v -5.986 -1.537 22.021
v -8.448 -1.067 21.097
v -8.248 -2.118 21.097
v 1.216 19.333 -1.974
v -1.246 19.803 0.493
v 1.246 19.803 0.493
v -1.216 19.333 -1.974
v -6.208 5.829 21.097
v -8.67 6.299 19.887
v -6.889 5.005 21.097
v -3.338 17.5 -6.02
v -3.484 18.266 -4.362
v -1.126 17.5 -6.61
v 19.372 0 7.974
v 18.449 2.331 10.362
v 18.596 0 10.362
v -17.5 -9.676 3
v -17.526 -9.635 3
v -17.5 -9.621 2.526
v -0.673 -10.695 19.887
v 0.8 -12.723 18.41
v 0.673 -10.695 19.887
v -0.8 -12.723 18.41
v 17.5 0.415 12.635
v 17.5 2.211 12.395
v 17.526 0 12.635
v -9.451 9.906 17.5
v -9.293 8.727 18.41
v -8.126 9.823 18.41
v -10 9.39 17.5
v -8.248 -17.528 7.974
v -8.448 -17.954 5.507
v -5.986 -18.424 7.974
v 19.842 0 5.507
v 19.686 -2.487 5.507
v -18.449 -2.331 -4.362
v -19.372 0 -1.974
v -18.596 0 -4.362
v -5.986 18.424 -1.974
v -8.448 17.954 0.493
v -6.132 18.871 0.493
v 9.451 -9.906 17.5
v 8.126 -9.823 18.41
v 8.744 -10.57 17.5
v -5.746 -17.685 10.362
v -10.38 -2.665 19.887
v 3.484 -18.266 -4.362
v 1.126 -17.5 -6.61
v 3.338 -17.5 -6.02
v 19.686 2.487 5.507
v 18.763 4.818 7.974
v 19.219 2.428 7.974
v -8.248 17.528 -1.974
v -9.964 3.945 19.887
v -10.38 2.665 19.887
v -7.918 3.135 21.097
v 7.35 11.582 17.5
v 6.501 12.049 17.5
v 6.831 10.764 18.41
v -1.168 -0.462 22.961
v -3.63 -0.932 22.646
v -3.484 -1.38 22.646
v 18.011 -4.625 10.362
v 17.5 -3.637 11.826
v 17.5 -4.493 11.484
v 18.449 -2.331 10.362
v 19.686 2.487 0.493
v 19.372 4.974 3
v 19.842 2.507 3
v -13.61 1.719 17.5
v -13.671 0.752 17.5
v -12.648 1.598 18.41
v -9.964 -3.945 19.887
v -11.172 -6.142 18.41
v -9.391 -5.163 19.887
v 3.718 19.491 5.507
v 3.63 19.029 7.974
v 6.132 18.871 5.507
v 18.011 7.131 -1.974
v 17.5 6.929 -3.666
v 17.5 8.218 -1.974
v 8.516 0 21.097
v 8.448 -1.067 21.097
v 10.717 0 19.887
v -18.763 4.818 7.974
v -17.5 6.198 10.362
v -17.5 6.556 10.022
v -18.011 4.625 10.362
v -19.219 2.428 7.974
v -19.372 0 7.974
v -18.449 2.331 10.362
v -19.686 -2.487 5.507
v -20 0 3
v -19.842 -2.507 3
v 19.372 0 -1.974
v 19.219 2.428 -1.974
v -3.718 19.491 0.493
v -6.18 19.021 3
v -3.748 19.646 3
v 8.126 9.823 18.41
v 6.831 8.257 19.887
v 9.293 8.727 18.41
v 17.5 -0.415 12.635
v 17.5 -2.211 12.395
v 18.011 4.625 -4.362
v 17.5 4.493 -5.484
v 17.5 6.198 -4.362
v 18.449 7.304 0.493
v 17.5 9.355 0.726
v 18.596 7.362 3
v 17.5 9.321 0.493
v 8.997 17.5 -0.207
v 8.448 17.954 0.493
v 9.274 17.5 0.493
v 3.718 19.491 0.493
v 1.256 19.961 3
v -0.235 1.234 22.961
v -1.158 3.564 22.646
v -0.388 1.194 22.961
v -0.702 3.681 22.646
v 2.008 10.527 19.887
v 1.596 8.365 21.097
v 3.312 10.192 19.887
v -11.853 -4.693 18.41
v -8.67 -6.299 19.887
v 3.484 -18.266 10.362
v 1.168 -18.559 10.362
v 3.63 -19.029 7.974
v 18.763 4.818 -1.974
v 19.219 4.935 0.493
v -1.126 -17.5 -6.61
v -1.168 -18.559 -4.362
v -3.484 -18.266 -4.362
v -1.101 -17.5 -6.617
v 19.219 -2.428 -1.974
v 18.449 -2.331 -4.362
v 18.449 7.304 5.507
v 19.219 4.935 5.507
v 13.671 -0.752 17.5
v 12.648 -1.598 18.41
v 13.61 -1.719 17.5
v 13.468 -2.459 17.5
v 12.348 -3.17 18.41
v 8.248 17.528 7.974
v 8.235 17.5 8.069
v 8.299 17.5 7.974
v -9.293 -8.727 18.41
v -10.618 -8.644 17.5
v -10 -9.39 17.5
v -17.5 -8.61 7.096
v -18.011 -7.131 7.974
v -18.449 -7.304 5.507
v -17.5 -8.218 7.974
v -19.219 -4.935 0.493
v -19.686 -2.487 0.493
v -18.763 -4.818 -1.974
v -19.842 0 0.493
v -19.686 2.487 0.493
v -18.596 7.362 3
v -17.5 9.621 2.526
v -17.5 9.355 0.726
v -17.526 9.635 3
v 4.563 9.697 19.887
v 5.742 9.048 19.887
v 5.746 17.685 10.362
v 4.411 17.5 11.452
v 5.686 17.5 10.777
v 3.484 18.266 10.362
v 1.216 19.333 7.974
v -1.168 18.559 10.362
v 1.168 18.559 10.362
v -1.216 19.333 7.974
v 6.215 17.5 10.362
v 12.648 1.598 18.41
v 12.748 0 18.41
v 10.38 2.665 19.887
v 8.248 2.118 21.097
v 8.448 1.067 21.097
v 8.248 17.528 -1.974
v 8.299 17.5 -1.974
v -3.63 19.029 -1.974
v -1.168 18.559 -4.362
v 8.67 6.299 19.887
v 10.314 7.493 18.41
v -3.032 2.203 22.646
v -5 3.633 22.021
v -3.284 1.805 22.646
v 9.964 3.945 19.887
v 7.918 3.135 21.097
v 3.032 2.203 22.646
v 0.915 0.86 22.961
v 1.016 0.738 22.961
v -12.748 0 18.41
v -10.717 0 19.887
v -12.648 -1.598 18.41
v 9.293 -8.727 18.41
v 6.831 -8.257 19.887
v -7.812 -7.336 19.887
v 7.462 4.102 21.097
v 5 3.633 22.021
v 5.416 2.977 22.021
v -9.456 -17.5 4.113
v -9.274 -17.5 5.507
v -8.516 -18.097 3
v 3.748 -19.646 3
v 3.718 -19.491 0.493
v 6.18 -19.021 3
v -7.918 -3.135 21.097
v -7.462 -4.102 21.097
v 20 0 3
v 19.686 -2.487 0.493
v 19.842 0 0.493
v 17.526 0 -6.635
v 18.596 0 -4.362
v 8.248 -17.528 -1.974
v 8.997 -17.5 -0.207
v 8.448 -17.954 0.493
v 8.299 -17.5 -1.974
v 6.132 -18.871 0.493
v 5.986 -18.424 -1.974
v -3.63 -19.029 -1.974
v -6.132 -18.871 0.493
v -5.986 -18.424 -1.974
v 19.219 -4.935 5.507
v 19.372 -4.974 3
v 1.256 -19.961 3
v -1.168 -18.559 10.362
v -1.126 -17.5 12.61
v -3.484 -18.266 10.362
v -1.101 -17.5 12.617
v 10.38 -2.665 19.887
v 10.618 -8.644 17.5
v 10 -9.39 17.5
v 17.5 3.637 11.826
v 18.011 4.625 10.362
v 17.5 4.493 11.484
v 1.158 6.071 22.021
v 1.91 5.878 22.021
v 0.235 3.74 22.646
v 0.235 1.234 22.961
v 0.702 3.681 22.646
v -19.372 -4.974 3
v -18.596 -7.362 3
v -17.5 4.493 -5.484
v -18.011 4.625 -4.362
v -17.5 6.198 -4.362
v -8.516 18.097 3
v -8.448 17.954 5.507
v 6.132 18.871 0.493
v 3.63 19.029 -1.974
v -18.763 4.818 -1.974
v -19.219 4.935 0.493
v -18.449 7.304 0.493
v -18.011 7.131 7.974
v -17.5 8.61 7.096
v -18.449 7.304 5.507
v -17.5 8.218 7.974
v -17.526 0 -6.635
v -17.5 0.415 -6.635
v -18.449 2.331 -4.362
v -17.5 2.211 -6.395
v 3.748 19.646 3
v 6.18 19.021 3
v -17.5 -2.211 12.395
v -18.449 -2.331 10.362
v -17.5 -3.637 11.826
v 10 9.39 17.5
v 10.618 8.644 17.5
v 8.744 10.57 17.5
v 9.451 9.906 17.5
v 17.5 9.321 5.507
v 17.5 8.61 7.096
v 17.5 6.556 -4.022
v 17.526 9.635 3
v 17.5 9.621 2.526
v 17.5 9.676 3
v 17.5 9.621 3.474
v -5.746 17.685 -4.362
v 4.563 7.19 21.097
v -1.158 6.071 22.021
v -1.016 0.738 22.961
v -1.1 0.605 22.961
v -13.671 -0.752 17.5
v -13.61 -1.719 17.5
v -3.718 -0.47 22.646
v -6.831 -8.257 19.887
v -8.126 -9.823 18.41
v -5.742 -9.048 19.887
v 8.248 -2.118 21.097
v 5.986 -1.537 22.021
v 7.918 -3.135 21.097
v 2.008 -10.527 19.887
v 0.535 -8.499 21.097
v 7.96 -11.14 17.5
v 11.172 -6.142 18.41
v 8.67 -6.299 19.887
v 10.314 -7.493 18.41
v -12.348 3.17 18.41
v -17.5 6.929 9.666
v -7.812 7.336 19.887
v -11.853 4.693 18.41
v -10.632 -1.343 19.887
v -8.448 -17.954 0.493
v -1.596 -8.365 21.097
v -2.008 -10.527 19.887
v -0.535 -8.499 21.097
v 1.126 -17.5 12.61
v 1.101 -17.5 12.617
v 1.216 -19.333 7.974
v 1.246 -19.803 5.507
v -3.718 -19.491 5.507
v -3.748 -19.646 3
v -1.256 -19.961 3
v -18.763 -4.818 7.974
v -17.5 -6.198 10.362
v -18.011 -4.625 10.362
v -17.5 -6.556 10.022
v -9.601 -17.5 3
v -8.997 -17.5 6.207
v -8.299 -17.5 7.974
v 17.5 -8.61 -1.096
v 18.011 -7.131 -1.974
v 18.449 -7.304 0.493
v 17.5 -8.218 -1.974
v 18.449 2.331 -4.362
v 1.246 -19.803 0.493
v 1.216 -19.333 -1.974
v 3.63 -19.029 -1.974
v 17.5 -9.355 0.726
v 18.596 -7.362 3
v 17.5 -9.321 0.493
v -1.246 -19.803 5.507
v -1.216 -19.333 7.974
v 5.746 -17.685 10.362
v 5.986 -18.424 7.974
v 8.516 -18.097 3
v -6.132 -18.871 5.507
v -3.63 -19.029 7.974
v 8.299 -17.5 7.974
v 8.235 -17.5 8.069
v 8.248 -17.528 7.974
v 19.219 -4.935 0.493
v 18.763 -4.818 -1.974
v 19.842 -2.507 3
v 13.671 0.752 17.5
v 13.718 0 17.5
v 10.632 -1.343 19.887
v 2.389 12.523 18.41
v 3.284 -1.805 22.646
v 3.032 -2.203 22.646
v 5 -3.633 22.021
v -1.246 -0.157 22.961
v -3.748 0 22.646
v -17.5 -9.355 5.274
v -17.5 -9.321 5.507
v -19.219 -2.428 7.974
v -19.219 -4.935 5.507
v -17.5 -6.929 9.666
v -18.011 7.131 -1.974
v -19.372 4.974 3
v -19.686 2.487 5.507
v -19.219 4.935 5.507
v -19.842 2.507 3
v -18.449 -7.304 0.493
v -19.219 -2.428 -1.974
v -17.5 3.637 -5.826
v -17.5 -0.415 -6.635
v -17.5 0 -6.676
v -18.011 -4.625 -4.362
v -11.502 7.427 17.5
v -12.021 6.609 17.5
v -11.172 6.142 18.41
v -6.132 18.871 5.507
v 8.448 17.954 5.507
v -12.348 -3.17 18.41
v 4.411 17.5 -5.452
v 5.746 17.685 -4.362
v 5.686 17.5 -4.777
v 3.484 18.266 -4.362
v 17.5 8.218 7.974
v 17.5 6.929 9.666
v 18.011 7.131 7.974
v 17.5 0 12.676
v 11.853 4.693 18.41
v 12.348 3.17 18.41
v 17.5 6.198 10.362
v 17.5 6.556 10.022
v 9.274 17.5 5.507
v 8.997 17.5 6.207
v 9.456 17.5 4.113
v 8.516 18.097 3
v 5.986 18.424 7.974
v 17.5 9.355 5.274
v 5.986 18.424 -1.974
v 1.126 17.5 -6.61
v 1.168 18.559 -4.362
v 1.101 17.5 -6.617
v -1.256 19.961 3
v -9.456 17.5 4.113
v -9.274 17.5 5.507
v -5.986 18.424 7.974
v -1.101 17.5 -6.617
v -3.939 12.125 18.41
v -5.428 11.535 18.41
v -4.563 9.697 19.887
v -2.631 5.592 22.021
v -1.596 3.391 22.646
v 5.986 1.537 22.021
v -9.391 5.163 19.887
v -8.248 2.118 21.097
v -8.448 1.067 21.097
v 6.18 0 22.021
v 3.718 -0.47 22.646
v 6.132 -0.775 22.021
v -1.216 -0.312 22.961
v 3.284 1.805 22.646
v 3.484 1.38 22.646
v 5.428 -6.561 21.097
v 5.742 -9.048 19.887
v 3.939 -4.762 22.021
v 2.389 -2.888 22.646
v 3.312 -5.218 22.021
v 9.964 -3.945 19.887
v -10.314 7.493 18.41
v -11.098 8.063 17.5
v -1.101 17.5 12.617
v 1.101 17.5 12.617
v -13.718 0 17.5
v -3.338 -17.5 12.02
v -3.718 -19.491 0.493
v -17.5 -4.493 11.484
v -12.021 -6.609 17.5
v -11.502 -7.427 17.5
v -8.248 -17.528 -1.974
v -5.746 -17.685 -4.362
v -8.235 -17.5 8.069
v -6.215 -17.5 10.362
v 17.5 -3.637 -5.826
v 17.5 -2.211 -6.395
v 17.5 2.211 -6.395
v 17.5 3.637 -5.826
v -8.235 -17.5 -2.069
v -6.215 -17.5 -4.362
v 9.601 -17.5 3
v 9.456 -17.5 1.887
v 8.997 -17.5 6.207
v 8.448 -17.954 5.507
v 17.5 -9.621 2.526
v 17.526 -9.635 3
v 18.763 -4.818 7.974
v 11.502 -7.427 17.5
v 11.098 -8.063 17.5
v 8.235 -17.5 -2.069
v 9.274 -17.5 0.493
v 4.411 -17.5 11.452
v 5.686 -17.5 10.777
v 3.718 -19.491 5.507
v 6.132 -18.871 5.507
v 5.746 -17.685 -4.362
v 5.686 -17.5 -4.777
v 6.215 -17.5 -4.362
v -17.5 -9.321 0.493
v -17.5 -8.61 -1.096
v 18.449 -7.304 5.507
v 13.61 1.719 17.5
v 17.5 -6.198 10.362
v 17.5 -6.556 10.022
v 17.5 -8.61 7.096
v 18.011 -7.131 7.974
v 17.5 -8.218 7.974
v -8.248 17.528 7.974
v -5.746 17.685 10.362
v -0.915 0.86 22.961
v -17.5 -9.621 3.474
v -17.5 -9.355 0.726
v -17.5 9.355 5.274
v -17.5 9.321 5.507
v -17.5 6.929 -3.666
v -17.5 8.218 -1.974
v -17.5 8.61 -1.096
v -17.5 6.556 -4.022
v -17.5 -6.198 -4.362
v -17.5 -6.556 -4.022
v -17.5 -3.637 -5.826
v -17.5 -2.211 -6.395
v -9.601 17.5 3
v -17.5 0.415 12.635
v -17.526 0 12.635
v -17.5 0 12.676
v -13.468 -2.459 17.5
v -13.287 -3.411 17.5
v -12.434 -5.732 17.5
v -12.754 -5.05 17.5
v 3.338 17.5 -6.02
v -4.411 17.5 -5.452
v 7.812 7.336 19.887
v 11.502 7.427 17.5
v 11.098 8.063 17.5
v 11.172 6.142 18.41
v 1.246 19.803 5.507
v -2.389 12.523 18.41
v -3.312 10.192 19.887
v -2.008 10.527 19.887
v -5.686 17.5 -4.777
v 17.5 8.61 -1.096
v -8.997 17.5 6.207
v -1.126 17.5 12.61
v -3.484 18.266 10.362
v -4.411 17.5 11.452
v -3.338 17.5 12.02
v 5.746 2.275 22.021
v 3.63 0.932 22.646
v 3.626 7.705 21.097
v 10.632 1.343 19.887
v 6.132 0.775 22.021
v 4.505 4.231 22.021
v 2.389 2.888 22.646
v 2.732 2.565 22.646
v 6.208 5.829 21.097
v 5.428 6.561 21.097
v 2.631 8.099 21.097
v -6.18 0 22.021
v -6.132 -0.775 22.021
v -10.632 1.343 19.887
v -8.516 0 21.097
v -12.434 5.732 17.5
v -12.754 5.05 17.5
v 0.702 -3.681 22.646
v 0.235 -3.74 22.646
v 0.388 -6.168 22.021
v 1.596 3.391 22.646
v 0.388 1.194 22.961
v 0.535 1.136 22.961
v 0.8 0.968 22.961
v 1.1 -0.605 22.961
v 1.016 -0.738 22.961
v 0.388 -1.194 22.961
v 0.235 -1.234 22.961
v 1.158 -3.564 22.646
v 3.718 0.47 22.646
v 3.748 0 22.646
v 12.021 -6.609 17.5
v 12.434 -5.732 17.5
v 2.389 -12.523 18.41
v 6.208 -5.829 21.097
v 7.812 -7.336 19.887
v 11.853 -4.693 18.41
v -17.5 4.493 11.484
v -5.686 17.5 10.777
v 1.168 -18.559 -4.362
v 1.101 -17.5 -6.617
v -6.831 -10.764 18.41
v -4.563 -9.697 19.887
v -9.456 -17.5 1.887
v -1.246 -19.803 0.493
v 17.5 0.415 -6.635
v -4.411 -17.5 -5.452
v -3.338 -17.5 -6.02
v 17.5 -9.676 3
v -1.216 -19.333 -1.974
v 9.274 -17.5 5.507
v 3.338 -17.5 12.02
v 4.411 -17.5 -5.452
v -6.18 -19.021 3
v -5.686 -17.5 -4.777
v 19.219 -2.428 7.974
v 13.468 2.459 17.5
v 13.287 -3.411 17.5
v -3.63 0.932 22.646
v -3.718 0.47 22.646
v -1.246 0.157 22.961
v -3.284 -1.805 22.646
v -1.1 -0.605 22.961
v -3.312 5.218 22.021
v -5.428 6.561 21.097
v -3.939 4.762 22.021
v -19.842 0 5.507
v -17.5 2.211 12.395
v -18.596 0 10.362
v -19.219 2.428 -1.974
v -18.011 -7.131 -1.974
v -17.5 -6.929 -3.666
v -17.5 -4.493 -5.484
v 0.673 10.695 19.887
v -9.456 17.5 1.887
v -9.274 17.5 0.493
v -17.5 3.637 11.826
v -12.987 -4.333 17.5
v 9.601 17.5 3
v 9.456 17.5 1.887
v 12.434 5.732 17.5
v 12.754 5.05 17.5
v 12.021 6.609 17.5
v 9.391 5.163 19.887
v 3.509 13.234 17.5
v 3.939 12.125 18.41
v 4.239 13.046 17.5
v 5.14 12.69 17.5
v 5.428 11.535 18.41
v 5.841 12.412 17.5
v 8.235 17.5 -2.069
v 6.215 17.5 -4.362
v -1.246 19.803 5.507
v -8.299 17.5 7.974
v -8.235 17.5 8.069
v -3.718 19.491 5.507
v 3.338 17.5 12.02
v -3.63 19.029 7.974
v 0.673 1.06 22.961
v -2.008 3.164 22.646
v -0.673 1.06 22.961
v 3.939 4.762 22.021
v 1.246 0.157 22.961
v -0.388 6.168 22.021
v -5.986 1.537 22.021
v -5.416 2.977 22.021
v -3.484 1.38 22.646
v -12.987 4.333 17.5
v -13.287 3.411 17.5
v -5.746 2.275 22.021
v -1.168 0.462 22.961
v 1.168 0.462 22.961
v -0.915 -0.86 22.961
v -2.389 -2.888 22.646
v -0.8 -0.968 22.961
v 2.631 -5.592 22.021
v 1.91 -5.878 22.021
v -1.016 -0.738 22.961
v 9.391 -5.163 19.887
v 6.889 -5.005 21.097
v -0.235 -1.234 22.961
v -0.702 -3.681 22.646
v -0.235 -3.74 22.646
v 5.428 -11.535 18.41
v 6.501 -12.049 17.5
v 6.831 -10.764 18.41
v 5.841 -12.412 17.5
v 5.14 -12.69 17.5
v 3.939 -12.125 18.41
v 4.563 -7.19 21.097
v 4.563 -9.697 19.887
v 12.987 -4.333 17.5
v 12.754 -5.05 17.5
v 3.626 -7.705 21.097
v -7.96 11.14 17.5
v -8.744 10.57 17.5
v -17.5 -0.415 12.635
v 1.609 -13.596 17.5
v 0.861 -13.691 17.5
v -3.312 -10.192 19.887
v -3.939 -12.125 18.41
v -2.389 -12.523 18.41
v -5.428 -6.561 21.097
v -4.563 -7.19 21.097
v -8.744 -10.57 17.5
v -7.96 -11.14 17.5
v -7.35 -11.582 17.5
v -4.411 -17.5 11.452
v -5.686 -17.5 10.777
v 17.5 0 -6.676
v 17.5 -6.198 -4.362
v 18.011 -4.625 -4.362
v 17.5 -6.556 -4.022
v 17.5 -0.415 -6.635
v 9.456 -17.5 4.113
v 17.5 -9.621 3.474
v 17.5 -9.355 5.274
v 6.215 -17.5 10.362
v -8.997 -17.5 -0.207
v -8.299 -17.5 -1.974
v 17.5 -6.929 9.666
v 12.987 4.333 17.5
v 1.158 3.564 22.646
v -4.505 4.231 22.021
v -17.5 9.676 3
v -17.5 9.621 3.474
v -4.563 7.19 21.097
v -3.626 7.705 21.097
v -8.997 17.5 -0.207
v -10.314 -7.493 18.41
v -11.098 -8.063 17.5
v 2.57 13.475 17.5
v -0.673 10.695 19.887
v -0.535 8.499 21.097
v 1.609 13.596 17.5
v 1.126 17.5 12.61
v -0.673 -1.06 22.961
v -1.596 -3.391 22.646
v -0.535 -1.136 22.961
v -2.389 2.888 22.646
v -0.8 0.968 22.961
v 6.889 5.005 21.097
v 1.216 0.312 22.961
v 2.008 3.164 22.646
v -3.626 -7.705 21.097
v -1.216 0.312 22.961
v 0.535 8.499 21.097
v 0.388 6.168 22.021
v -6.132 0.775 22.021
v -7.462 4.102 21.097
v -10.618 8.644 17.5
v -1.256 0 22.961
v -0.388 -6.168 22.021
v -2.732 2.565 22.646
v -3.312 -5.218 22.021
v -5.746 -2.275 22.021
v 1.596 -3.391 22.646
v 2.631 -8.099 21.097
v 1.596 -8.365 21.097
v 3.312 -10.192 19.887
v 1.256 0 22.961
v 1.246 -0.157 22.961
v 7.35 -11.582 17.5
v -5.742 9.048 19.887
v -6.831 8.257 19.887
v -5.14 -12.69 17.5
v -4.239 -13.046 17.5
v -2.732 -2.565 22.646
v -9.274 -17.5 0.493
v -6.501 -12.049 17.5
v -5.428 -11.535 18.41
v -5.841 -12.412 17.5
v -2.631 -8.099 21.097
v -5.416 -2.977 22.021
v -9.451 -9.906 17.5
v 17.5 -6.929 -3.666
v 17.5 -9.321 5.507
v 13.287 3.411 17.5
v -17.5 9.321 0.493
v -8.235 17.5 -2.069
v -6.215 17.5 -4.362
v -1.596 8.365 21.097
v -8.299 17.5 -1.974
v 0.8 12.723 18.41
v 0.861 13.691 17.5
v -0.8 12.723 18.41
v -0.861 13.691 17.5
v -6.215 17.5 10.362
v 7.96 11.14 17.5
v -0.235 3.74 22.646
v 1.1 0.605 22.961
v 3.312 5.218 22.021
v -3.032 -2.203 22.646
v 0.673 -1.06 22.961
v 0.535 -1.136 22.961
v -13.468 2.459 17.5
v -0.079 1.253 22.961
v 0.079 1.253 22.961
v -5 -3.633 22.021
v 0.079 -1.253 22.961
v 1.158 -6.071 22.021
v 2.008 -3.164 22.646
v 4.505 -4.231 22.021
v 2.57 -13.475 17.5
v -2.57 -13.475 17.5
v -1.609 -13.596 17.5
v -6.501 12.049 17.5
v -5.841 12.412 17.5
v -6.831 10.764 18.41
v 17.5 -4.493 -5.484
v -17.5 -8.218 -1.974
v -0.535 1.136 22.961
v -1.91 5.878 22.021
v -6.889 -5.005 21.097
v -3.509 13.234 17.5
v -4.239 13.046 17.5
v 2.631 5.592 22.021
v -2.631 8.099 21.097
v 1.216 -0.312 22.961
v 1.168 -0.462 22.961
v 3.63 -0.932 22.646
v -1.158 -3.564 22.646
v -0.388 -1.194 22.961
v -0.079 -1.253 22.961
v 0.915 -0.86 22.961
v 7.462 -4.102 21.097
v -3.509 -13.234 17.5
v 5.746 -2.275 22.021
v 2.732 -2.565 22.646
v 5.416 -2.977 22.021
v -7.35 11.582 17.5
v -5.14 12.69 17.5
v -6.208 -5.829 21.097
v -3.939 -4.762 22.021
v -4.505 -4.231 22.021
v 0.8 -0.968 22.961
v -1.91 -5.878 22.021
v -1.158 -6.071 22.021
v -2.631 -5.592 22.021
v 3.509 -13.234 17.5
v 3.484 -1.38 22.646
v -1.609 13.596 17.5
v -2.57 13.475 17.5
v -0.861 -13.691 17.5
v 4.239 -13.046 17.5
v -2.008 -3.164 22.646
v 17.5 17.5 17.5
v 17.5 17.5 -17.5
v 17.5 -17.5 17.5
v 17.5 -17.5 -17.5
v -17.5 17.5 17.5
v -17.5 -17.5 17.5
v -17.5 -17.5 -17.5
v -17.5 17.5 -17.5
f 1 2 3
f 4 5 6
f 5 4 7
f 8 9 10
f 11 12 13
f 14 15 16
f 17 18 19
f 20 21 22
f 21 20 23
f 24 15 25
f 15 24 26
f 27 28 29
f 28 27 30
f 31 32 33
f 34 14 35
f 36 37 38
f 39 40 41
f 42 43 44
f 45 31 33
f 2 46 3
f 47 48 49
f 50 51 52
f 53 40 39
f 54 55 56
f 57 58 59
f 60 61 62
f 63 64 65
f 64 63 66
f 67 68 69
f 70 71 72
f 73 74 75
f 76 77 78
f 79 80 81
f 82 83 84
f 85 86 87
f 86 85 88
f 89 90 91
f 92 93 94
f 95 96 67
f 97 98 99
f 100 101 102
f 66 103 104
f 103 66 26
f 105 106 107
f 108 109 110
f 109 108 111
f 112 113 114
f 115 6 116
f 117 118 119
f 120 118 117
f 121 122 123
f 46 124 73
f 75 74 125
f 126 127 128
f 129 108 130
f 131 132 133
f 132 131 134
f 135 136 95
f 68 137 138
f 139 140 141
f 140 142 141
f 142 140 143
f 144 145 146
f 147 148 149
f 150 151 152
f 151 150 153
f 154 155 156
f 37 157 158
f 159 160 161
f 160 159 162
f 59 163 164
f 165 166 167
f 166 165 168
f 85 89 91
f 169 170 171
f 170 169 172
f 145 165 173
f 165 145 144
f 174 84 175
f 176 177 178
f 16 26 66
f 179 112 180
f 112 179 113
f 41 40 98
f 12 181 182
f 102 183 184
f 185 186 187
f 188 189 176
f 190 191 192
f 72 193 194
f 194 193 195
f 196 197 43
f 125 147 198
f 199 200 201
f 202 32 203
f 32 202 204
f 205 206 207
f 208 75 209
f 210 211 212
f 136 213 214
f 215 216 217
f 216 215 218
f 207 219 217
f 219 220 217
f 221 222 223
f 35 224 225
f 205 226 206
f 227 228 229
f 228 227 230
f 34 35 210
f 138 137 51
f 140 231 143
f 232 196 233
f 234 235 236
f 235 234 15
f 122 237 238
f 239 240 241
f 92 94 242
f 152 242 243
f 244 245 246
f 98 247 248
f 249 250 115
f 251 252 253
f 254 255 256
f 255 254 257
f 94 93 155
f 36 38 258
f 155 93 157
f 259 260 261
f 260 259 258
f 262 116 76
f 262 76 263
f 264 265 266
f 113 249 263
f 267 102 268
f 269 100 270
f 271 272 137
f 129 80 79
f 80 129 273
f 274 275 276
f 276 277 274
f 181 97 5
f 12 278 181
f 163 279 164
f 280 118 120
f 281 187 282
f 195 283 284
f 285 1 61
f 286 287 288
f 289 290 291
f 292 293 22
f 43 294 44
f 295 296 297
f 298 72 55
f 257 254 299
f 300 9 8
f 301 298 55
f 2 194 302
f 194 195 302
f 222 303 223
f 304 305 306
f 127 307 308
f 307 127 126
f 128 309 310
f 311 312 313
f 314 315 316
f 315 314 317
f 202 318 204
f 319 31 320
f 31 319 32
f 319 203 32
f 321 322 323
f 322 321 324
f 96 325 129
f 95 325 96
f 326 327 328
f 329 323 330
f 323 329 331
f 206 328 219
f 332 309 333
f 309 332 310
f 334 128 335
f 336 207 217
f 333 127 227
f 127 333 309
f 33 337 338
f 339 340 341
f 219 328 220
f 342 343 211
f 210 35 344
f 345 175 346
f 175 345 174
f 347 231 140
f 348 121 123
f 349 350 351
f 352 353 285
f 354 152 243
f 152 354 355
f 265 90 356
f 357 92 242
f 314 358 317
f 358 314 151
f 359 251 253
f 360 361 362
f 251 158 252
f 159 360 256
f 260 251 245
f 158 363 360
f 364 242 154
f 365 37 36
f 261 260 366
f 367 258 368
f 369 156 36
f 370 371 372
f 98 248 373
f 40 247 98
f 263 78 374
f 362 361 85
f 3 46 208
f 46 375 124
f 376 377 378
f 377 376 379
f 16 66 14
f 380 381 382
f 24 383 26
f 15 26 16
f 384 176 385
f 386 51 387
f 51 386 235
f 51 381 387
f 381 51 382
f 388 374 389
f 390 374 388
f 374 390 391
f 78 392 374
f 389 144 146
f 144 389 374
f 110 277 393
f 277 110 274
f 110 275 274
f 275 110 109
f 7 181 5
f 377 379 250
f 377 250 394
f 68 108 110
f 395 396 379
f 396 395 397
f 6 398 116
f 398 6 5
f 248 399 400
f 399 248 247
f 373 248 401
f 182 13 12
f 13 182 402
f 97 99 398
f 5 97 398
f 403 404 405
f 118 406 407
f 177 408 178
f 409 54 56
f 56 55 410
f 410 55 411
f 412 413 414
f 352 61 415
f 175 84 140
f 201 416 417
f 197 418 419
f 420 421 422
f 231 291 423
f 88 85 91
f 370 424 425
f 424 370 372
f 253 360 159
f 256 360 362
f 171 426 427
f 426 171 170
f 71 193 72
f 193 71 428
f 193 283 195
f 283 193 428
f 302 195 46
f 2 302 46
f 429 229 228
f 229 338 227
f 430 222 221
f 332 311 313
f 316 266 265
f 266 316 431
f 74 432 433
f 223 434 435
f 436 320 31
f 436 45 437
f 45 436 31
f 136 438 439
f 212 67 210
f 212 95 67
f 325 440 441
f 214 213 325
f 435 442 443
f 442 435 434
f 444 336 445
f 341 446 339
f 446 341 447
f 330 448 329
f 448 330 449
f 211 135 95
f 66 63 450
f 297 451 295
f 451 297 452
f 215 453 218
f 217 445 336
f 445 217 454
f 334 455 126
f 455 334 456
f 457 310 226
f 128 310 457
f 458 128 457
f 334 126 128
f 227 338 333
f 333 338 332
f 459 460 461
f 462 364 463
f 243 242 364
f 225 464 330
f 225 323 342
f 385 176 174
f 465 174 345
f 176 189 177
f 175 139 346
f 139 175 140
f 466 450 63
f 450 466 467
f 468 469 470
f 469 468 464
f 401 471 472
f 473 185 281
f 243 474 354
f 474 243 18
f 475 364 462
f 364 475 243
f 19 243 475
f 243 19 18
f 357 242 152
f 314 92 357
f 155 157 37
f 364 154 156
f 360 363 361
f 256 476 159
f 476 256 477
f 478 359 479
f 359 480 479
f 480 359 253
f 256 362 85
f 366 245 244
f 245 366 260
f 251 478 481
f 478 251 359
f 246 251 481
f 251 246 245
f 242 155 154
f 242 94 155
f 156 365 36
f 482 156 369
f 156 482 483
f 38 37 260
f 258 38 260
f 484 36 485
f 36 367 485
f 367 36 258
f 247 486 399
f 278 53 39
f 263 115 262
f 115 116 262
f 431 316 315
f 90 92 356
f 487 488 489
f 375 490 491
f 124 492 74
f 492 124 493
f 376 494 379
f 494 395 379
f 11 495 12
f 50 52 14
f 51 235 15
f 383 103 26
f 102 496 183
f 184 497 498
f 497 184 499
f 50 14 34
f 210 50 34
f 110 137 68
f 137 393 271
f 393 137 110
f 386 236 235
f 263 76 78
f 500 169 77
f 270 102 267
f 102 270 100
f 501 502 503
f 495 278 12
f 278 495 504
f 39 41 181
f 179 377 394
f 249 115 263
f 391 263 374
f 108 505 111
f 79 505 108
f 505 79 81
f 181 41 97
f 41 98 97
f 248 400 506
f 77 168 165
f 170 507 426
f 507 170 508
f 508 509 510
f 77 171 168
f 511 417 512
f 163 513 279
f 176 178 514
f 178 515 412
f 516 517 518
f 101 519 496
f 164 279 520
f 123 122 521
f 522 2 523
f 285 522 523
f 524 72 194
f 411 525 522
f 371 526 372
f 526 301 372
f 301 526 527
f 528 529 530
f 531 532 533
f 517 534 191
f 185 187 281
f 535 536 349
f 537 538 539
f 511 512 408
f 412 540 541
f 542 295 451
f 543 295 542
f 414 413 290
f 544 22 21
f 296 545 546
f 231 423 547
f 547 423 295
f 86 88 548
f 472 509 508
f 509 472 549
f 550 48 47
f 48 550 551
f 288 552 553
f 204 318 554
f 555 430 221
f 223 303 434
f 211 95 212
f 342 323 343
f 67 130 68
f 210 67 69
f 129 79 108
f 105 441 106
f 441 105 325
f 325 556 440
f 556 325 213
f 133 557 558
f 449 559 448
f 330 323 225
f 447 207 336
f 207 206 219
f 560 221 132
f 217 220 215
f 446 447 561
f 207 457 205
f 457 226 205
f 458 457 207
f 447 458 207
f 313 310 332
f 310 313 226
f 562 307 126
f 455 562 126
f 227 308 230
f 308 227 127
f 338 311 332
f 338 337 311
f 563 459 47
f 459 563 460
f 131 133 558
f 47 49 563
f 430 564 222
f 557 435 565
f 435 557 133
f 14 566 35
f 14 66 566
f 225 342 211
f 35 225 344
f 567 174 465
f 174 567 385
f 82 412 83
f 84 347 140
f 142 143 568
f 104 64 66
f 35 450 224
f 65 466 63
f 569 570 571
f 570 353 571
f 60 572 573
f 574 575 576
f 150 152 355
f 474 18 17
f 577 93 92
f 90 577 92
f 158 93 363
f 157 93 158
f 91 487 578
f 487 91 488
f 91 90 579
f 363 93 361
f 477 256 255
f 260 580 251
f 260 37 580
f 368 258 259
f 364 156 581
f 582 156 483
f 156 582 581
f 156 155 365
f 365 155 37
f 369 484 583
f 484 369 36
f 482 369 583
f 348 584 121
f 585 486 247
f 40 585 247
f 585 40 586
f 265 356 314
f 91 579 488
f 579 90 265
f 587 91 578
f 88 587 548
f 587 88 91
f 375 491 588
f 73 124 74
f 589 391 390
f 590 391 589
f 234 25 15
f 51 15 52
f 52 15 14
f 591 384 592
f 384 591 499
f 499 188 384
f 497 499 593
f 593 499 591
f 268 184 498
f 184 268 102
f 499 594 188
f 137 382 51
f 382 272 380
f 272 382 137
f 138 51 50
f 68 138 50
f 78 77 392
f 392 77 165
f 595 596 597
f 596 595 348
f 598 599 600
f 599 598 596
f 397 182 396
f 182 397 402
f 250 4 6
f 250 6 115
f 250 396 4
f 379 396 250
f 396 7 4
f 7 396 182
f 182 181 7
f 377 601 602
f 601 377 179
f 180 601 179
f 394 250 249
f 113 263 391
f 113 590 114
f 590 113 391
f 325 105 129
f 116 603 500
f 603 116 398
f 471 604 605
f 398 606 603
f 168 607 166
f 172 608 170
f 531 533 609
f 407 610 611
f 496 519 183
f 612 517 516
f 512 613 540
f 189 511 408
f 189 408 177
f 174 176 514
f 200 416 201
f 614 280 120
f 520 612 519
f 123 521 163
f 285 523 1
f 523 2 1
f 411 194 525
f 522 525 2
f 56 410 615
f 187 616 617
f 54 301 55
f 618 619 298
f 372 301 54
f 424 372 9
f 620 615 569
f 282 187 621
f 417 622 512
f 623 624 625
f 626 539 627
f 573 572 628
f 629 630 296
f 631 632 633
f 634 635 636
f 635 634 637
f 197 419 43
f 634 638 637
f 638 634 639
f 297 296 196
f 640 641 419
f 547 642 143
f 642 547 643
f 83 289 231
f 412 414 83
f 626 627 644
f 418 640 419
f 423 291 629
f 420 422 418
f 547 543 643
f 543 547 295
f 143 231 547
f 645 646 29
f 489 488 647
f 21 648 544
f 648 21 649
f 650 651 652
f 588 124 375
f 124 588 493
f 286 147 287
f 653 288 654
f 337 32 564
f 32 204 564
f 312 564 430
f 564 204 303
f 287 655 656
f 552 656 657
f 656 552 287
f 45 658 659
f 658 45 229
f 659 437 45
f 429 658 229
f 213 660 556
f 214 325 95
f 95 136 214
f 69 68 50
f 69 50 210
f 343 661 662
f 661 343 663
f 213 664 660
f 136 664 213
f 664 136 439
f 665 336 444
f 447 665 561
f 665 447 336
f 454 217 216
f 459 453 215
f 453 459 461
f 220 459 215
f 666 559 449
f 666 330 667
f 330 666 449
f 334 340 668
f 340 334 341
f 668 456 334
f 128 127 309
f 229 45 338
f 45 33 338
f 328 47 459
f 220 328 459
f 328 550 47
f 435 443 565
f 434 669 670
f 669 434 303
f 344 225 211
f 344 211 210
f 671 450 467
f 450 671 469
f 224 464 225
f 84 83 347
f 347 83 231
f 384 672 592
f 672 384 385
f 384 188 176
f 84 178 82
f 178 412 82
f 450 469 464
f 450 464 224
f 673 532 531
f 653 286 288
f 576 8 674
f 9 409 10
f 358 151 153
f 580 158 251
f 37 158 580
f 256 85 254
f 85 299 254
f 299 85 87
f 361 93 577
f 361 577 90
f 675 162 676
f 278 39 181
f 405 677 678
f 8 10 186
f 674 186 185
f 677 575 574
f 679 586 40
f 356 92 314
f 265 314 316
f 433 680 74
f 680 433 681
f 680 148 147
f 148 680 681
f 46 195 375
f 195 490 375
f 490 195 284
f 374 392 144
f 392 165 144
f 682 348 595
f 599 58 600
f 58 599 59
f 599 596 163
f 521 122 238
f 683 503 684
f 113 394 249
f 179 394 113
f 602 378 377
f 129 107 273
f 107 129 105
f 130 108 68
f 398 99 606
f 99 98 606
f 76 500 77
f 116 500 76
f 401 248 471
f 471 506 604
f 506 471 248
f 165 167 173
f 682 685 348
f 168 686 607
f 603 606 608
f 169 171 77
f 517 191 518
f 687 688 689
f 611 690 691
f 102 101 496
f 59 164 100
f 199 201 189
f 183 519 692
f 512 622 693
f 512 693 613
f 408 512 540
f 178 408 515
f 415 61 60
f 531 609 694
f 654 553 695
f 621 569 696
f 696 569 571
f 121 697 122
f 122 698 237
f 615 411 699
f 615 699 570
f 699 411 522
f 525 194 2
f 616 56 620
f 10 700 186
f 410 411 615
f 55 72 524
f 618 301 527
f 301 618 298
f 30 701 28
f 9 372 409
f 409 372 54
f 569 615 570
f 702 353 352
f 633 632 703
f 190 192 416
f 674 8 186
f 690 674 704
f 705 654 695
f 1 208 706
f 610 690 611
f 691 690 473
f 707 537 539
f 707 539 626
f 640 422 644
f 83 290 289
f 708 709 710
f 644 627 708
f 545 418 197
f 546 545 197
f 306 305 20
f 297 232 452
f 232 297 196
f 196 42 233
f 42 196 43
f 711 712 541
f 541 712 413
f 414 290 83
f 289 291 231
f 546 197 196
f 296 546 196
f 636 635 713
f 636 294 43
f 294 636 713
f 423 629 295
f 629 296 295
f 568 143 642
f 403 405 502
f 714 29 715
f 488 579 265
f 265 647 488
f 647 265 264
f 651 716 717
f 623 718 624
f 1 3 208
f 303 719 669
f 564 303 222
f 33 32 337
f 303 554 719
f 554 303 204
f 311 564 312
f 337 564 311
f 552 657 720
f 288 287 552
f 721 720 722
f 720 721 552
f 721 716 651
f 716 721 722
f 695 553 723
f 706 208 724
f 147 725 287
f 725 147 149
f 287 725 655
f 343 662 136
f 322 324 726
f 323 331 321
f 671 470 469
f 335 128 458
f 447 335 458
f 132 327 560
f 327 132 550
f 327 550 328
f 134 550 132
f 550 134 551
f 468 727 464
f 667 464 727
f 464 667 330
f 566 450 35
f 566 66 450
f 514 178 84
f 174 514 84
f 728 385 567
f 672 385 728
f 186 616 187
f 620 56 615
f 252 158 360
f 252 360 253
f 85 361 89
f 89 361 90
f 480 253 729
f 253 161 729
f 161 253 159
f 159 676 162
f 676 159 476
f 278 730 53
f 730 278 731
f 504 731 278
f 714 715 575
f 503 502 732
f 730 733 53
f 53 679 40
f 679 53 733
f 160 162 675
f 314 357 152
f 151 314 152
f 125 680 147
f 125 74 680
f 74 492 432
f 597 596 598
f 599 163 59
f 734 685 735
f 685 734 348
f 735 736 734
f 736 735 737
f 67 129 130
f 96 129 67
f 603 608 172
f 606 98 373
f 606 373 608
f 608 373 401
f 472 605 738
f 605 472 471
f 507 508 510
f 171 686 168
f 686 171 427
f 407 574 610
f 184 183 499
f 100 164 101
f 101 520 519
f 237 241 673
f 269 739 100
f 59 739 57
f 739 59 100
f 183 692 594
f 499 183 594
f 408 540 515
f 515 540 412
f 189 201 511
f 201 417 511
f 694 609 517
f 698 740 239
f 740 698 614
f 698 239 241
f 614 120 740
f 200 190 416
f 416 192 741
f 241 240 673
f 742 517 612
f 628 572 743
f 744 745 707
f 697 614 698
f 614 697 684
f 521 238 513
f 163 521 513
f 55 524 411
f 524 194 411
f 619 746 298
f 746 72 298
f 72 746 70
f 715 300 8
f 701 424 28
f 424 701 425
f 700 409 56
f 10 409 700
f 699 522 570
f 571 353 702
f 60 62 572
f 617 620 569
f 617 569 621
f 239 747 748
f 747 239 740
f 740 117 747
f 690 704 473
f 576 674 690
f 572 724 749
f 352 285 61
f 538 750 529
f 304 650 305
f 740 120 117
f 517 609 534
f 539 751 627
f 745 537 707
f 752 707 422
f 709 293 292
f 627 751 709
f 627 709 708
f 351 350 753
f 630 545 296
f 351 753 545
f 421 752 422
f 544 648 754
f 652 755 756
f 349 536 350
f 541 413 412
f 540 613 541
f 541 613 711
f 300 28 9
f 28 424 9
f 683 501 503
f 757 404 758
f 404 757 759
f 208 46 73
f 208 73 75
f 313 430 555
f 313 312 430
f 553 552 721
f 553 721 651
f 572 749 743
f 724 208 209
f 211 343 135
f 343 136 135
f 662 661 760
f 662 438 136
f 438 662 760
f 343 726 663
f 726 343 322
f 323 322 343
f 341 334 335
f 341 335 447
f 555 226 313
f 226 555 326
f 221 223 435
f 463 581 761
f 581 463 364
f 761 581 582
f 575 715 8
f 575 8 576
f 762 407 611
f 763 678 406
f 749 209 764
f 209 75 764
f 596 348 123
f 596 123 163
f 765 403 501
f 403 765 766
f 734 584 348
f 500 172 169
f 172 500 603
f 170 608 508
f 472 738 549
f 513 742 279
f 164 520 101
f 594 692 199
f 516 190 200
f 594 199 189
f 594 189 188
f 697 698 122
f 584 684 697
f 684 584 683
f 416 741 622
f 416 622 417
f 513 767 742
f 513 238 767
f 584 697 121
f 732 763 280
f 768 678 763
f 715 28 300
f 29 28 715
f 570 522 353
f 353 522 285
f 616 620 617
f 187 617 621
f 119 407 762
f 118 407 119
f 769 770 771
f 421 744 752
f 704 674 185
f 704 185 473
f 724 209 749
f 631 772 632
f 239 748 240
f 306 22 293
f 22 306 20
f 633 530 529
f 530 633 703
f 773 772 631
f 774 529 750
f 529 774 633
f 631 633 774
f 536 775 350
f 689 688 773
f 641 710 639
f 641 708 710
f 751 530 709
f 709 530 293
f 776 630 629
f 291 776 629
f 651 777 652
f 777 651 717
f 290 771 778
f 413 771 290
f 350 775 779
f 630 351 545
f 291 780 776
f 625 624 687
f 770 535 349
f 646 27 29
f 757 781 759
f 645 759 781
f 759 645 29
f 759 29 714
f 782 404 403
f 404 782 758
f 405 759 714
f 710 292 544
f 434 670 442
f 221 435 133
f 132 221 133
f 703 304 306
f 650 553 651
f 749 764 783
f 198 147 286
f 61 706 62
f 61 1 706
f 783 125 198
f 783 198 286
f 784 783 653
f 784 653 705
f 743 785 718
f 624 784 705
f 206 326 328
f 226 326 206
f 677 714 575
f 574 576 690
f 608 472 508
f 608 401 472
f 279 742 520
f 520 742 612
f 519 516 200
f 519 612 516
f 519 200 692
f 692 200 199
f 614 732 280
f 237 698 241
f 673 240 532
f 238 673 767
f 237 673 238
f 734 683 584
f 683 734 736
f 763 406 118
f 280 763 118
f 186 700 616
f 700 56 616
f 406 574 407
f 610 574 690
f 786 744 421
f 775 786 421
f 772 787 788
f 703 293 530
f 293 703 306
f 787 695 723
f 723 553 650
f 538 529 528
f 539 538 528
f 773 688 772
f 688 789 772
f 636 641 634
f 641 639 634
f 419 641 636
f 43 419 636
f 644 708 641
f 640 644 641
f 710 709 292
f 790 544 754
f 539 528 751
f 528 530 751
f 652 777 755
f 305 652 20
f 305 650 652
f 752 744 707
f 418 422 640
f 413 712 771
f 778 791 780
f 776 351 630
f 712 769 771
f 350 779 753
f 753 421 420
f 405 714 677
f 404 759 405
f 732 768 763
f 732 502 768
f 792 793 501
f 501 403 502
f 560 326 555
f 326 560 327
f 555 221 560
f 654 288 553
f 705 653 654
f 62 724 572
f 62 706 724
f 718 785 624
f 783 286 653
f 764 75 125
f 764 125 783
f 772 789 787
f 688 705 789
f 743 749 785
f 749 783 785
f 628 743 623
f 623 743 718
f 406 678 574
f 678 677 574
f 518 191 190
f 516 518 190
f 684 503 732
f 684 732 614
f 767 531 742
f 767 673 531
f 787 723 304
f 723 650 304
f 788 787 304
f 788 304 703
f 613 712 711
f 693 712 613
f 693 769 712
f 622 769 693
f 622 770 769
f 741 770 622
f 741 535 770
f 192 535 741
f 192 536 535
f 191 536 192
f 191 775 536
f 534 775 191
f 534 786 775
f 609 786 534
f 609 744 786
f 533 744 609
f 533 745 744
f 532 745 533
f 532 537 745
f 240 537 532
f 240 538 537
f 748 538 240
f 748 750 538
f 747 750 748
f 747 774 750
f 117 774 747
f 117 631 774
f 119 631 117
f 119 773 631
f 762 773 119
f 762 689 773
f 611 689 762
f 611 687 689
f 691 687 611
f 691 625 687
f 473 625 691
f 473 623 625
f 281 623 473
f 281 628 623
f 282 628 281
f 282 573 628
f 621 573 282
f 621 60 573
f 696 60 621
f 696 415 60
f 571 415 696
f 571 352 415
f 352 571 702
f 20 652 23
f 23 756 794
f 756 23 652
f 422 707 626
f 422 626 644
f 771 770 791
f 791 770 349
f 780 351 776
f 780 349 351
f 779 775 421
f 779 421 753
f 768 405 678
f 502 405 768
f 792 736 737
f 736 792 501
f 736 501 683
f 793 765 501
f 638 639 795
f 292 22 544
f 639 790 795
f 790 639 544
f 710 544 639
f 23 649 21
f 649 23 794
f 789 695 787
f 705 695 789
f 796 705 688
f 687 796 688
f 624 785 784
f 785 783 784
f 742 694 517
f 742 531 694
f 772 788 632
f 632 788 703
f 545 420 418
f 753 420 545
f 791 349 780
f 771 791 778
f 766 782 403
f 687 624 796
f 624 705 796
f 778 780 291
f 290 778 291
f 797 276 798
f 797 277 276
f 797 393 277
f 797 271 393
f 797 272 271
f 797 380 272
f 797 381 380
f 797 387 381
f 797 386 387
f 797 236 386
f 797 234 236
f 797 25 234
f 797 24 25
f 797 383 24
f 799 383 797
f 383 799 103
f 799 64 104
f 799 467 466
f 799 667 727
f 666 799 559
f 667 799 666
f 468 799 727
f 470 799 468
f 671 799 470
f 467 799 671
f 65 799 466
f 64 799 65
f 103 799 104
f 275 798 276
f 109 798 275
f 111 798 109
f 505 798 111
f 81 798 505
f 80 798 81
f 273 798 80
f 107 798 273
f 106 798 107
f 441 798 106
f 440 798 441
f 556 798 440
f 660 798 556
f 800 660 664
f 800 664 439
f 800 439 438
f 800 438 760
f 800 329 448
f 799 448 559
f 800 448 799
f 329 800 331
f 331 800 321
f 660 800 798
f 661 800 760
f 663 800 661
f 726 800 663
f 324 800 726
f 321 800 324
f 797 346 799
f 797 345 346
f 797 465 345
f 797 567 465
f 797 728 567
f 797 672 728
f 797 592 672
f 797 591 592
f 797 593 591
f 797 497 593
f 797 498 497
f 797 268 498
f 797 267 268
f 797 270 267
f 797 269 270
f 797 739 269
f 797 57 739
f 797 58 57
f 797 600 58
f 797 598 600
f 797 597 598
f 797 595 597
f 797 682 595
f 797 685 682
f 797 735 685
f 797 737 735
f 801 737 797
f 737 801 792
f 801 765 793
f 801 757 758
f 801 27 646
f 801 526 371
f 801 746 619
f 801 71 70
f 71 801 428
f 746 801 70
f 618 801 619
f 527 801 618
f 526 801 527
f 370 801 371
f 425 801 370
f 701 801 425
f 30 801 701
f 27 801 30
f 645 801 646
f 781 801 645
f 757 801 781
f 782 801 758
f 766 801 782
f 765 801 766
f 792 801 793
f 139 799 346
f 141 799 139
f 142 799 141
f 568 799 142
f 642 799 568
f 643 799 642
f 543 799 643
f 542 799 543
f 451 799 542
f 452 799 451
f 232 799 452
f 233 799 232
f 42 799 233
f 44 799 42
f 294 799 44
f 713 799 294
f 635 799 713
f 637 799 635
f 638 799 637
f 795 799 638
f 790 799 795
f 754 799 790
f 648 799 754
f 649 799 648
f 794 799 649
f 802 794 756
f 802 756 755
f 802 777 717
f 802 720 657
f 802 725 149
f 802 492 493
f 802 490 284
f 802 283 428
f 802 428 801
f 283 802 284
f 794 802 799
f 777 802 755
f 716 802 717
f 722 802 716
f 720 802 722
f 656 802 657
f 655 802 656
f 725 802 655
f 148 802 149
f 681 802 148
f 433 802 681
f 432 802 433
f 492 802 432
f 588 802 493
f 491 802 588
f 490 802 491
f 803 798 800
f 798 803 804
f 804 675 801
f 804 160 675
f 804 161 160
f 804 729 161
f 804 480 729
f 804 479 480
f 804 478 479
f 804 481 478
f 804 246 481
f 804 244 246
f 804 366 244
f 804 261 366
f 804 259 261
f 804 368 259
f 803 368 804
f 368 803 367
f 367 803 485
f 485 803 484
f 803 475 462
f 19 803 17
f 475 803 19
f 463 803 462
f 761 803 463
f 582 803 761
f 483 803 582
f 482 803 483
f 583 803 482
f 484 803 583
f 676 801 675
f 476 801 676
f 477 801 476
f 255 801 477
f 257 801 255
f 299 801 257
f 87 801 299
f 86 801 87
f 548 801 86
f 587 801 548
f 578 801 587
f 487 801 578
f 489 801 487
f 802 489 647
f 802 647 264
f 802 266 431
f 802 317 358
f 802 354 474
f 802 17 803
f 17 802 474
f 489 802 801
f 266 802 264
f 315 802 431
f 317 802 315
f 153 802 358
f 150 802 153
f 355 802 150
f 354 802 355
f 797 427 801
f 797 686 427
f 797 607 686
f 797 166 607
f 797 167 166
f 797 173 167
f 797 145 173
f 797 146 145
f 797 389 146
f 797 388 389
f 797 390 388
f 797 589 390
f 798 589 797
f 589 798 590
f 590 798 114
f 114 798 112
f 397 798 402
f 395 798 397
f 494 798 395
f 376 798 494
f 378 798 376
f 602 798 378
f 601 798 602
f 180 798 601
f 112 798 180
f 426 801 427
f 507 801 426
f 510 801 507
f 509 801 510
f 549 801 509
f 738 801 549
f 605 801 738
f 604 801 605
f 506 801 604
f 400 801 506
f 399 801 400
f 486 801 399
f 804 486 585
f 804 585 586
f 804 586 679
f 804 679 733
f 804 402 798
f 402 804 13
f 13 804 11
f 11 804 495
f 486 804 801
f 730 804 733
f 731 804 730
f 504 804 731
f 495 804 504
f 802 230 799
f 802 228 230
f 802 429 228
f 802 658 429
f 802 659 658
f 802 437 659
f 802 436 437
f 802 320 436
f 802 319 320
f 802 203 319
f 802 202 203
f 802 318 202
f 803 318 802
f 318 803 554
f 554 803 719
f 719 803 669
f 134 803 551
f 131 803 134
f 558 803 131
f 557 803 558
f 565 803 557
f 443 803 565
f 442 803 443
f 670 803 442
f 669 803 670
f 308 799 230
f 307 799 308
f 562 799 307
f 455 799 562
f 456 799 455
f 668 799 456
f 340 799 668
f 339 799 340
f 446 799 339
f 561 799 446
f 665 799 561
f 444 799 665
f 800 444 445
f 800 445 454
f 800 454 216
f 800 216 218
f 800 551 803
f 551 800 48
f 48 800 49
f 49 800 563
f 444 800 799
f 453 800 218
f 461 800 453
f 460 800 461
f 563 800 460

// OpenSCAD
// Very simple model

translate([0,0,3])
{
	sphere(20, $fn=50);
}
cube(35, center=true);
